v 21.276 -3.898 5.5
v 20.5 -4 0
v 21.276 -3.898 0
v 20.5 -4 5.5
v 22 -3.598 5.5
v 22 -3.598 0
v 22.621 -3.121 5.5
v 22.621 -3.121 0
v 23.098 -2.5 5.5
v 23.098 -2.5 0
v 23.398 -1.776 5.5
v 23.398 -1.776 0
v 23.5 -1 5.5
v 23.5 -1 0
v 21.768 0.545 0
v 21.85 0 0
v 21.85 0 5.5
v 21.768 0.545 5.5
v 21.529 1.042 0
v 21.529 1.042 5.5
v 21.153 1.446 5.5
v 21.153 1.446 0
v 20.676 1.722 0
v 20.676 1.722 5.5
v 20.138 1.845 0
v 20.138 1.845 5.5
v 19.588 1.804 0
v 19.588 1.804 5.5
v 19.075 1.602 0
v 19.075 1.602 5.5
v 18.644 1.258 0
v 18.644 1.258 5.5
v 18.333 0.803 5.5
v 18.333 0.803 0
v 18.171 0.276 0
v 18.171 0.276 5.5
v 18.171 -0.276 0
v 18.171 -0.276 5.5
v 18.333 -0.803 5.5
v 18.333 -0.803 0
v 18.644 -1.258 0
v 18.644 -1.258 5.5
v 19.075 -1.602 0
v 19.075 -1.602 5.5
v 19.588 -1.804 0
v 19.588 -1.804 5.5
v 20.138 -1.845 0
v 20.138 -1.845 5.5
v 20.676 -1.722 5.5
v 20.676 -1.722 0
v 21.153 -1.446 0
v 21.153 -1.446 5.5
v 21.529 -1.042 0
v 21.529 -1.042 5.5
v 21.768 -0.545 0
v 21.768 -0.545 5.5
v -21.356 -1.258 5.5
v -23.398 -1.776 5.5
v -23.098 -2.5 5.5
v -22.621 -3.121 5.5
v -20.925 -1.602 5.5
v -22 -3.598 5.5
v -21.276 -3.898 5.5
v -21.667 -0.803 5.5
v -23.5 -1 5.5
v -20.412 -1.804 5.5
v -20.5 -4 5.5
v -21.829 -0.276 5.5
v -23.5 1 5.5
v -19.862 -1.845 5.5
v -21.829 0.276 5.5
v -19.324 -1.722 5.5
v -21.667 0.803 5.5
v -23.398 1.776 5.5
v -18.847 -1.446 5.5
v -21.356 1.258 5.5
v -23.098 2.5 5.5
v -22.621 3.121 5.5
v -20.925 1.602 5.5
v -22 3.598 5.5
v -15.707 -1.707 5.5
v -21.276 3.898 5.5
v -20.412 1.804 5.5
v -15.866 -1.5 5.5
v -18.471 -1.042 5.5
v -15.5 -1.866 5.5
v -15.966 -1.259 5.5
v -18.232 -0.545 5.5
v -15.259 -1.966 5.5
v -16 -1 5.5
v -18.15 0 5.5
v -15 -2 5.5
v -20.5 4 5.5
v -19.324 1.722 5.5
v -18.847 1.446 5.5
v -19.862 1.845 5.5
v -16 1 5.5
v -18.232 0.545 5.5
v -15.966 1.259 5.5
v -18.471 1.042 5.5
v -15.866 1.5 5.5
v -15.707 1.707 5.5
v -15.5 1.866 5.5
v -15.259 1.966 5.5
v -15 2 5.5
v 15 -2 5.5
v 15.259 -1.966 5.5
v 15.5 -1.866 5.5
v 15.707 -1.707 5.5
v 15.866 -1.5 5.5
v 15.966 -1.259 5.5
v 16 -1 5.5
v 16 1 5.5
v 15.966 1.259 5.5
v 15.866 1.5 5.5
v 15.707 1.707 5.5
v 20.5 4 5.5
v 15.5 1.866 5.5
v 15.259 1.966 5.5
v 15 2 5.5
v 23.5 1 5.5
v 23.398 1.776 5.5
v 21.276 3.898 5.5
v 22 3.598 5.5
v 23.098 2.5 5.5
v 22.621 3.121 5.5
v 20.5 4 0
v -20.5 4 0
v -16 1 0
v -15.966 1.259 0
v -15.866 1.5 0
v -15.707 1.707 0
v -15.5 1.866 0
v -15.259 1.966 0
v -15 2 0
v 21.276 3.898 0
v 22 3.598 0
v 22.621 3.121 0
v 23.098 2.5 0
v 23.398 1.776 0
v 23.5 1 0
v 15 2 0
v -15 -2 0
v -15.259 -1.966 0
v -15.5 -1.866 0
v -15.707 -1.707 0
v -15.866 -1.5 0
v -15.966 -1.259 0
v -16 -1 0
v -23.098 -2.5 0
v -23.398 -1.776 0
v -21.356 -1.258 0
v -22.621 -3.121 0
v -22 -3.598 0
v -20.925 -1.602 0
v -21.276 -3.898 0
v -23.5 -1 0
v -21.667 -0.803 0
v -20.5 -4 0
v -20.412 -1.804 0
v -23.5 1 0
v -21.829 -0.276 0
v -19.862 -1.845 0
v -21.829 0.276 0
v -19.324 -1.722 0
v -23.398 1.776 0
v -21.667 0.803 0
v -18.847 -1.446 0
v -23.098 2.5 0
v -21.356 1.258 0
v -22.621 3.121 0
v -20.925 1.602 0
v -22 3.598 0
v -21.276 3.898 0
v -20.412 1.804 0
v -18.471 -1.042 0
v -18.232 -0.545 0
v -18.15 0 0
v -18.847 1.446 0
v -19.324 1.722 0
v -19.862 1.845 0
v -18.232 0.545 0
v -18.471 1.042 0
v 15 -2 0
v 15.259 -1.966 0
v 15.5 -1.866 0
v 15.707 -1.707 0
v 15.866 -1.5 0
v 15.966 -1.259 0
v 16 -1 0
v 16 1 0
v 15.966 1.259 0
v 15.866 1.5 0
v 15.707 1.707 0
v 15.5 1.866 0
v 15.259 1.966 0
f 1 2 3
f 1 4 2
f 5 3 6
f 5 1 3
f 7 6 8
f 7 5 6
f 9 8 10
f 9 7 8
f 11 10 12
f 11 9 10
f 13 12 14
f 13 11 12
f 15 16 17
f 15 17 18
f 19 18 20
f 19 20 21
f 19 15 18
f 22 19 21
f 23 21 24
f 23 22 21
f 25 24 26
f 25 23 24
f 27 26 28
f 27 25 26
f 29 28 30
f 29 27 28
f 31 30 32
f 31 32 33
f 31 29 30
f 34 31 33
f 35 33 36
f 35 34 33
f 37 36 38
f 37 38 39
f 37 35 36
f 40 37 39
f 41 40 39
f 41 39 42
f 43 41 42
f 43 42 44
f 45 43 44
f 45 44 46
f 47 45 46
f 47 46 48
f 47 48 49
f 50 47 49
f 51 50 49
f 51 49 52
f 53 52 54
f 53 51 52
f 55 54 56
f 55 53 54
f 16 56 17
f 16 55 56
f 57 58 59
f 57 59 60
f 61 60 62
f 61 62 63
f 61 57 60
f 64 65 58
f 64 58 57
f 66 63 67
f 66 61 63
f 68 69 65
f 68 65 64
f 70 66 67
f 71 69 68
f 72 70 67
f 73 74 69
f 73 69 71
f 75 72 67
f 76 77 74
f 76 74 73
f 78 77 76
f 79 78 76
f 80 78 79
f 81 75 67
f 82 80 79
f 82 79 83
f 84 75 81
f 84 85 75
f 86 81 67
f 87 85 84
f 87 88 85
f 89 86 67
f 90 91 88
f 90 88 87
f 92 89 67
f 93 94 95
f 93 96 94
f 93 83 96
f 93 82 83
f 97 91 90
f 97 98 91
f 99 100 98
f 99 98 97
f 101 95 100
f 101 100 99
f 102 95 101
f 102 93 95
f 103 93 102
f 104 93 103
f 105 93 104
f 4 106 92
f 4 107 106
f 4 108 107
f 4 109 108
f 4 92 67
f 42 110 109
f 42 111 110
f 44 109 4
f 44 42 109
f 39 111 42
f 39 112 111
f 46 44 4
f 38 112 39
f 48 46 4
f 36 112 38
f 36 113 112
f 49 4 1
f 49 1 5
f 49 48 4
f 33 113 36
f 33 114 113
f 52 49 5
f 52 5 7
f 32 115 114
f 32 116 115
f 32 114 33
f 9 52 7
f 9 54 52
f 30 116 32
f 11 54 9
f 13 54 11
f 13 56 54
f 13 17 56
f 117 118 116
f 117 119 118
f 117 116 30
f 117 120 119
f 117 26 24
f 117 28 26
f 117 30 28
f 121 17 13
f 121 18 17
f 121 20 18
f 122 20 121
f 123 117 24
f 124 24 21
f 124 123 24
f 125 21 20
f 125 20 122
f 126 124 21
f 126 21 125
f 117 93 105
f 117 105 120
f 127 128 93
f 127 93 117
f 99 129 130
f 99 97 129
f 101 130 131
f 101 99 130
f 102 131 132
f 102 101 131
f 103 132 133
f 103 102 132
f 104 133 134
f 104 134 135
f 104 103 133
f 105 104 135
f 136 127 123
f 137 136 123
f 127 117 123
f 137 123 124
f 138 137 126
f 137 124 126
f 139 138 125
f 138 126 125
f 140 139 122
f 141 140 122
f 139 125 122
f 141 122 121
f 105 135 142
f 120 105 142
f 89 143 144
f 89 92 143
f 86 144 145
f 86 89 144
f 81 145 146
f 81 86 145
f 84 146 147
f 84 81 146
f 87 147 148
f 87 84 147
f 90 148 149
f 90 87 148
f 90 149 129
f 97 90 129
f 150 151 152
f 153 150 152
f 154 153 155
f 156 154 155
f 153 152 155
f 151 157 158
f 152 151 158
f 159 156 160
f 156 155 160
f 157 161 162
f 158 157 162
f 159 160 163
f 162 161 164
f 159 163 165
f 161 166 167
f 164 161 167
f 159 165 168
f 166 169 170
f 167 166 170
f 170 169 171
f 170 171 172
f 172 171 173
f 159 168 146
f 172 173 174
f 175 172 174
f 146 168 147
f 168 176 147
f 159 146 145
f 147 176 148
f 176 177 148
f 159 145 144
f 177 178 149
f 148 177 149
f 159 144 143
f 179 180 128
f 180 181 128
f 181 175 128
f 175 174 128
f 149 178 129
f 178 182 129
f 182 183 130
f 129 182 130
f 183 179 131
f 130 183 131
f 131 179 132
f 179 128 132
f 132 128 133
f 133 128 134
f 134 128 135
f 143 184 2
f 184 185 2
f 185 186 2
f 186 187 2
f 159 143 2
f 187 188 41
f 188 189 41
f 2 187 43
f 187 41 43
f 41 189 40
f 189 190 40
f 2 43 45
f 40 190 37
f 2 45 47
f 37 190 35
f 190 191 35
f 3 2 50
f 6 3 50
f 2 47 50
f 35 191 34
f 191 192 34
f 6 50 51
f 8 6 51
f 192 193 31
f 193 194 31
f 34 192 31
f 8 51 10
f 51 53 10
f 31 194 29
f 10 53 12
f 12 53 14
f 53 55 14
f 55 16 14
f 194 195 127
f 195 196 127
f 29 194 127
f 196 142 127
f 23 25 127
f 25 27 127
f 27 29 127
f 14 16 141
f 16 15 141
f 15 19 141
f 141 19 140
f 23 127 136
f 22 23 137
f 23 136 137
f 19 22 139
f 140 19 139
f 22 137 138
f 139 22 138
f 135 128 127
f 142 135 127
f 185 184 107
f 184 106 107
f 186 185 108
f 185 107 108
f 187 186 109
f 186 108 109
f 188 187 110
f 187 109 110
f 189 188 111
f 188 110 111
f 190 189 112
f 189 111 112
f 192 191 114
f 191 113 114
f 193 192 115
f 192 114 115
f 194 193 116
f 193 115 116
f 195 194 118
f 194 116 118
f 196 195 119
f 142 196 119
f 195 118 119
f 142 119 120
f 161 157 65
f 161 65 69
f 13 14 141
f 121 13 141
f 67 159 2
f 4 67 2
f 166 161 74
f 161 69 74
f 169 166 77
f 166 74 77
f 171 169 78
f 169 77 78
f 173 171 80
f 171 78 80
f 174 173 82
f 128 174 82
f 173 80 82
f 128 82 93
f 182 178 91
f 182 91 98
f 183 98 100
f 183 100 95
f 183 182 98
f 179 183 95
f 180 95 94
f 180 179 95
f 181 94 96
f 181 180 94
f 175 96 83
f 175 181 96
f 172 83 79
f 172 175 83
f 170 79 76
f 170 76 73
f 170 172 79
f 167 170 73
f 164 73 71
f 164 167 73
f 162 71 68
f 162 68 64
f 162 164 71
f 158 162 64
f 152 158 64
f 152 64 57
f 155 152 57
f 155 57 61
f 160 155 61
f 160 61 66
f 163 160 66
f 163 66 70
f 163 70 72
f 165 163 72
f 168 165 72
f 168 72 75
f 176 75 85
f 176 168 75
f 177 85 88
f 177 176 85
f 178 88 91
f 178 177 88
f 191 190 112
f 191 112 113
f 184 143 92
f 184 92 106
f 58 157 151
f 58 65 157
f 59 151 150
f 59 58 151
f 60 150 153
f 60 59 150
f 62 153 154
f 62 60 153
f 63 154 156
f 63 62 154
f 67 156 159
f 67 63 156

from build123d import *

# Parameters (mm, degrees)
F0_W     = 47
F0_H     = 8
F0_R     = 1.85
F0_W_2   = 32
F0_H_2   = 4
F1_DEPTH = 5.5
F2_R     = 3
F3_R     = 1


with BuildPart() as f1:
    # F0 (on Top) → F1 (new body)
    with BuildSketch(Plane.XY):
        Rectangle(F0_W, F0_H)
        with Locations((-20, 0)):
            Circle(F0_R, mode=Mode.SUBTRACT)
        Rectangle(F0_W_2, F0_H_2, mode=Mode.SUBTRACT)
        with Locations((20, 0)):
            Circle(F0_R, mode=Mode.SUBTRACT)
    extrude(amount=F1_DEPTH)

    # F2
    f2_edges = [f1.edges().sort_by_distance(p)[0] for p in [
        (23.5, -4, 2.75),
        (23.5, 4, 2.75),
        (-23.5, -4, 2.75),
        (-23.5, 4, 2.75),
    ]]
    fillet(f2_edges, radius=F2_R)

    # F3
    f3_edges = [f1.edges().sort_by_distance(p)[0] for p in [
        (-16, 2, 2.75),
        (16, 2, 2.75),
        (16, -2, 2.75),
        (-16, -2, 2.75),
    ]]
    fillet(f3_edges, radius=F3_R)


solid = f1.part
